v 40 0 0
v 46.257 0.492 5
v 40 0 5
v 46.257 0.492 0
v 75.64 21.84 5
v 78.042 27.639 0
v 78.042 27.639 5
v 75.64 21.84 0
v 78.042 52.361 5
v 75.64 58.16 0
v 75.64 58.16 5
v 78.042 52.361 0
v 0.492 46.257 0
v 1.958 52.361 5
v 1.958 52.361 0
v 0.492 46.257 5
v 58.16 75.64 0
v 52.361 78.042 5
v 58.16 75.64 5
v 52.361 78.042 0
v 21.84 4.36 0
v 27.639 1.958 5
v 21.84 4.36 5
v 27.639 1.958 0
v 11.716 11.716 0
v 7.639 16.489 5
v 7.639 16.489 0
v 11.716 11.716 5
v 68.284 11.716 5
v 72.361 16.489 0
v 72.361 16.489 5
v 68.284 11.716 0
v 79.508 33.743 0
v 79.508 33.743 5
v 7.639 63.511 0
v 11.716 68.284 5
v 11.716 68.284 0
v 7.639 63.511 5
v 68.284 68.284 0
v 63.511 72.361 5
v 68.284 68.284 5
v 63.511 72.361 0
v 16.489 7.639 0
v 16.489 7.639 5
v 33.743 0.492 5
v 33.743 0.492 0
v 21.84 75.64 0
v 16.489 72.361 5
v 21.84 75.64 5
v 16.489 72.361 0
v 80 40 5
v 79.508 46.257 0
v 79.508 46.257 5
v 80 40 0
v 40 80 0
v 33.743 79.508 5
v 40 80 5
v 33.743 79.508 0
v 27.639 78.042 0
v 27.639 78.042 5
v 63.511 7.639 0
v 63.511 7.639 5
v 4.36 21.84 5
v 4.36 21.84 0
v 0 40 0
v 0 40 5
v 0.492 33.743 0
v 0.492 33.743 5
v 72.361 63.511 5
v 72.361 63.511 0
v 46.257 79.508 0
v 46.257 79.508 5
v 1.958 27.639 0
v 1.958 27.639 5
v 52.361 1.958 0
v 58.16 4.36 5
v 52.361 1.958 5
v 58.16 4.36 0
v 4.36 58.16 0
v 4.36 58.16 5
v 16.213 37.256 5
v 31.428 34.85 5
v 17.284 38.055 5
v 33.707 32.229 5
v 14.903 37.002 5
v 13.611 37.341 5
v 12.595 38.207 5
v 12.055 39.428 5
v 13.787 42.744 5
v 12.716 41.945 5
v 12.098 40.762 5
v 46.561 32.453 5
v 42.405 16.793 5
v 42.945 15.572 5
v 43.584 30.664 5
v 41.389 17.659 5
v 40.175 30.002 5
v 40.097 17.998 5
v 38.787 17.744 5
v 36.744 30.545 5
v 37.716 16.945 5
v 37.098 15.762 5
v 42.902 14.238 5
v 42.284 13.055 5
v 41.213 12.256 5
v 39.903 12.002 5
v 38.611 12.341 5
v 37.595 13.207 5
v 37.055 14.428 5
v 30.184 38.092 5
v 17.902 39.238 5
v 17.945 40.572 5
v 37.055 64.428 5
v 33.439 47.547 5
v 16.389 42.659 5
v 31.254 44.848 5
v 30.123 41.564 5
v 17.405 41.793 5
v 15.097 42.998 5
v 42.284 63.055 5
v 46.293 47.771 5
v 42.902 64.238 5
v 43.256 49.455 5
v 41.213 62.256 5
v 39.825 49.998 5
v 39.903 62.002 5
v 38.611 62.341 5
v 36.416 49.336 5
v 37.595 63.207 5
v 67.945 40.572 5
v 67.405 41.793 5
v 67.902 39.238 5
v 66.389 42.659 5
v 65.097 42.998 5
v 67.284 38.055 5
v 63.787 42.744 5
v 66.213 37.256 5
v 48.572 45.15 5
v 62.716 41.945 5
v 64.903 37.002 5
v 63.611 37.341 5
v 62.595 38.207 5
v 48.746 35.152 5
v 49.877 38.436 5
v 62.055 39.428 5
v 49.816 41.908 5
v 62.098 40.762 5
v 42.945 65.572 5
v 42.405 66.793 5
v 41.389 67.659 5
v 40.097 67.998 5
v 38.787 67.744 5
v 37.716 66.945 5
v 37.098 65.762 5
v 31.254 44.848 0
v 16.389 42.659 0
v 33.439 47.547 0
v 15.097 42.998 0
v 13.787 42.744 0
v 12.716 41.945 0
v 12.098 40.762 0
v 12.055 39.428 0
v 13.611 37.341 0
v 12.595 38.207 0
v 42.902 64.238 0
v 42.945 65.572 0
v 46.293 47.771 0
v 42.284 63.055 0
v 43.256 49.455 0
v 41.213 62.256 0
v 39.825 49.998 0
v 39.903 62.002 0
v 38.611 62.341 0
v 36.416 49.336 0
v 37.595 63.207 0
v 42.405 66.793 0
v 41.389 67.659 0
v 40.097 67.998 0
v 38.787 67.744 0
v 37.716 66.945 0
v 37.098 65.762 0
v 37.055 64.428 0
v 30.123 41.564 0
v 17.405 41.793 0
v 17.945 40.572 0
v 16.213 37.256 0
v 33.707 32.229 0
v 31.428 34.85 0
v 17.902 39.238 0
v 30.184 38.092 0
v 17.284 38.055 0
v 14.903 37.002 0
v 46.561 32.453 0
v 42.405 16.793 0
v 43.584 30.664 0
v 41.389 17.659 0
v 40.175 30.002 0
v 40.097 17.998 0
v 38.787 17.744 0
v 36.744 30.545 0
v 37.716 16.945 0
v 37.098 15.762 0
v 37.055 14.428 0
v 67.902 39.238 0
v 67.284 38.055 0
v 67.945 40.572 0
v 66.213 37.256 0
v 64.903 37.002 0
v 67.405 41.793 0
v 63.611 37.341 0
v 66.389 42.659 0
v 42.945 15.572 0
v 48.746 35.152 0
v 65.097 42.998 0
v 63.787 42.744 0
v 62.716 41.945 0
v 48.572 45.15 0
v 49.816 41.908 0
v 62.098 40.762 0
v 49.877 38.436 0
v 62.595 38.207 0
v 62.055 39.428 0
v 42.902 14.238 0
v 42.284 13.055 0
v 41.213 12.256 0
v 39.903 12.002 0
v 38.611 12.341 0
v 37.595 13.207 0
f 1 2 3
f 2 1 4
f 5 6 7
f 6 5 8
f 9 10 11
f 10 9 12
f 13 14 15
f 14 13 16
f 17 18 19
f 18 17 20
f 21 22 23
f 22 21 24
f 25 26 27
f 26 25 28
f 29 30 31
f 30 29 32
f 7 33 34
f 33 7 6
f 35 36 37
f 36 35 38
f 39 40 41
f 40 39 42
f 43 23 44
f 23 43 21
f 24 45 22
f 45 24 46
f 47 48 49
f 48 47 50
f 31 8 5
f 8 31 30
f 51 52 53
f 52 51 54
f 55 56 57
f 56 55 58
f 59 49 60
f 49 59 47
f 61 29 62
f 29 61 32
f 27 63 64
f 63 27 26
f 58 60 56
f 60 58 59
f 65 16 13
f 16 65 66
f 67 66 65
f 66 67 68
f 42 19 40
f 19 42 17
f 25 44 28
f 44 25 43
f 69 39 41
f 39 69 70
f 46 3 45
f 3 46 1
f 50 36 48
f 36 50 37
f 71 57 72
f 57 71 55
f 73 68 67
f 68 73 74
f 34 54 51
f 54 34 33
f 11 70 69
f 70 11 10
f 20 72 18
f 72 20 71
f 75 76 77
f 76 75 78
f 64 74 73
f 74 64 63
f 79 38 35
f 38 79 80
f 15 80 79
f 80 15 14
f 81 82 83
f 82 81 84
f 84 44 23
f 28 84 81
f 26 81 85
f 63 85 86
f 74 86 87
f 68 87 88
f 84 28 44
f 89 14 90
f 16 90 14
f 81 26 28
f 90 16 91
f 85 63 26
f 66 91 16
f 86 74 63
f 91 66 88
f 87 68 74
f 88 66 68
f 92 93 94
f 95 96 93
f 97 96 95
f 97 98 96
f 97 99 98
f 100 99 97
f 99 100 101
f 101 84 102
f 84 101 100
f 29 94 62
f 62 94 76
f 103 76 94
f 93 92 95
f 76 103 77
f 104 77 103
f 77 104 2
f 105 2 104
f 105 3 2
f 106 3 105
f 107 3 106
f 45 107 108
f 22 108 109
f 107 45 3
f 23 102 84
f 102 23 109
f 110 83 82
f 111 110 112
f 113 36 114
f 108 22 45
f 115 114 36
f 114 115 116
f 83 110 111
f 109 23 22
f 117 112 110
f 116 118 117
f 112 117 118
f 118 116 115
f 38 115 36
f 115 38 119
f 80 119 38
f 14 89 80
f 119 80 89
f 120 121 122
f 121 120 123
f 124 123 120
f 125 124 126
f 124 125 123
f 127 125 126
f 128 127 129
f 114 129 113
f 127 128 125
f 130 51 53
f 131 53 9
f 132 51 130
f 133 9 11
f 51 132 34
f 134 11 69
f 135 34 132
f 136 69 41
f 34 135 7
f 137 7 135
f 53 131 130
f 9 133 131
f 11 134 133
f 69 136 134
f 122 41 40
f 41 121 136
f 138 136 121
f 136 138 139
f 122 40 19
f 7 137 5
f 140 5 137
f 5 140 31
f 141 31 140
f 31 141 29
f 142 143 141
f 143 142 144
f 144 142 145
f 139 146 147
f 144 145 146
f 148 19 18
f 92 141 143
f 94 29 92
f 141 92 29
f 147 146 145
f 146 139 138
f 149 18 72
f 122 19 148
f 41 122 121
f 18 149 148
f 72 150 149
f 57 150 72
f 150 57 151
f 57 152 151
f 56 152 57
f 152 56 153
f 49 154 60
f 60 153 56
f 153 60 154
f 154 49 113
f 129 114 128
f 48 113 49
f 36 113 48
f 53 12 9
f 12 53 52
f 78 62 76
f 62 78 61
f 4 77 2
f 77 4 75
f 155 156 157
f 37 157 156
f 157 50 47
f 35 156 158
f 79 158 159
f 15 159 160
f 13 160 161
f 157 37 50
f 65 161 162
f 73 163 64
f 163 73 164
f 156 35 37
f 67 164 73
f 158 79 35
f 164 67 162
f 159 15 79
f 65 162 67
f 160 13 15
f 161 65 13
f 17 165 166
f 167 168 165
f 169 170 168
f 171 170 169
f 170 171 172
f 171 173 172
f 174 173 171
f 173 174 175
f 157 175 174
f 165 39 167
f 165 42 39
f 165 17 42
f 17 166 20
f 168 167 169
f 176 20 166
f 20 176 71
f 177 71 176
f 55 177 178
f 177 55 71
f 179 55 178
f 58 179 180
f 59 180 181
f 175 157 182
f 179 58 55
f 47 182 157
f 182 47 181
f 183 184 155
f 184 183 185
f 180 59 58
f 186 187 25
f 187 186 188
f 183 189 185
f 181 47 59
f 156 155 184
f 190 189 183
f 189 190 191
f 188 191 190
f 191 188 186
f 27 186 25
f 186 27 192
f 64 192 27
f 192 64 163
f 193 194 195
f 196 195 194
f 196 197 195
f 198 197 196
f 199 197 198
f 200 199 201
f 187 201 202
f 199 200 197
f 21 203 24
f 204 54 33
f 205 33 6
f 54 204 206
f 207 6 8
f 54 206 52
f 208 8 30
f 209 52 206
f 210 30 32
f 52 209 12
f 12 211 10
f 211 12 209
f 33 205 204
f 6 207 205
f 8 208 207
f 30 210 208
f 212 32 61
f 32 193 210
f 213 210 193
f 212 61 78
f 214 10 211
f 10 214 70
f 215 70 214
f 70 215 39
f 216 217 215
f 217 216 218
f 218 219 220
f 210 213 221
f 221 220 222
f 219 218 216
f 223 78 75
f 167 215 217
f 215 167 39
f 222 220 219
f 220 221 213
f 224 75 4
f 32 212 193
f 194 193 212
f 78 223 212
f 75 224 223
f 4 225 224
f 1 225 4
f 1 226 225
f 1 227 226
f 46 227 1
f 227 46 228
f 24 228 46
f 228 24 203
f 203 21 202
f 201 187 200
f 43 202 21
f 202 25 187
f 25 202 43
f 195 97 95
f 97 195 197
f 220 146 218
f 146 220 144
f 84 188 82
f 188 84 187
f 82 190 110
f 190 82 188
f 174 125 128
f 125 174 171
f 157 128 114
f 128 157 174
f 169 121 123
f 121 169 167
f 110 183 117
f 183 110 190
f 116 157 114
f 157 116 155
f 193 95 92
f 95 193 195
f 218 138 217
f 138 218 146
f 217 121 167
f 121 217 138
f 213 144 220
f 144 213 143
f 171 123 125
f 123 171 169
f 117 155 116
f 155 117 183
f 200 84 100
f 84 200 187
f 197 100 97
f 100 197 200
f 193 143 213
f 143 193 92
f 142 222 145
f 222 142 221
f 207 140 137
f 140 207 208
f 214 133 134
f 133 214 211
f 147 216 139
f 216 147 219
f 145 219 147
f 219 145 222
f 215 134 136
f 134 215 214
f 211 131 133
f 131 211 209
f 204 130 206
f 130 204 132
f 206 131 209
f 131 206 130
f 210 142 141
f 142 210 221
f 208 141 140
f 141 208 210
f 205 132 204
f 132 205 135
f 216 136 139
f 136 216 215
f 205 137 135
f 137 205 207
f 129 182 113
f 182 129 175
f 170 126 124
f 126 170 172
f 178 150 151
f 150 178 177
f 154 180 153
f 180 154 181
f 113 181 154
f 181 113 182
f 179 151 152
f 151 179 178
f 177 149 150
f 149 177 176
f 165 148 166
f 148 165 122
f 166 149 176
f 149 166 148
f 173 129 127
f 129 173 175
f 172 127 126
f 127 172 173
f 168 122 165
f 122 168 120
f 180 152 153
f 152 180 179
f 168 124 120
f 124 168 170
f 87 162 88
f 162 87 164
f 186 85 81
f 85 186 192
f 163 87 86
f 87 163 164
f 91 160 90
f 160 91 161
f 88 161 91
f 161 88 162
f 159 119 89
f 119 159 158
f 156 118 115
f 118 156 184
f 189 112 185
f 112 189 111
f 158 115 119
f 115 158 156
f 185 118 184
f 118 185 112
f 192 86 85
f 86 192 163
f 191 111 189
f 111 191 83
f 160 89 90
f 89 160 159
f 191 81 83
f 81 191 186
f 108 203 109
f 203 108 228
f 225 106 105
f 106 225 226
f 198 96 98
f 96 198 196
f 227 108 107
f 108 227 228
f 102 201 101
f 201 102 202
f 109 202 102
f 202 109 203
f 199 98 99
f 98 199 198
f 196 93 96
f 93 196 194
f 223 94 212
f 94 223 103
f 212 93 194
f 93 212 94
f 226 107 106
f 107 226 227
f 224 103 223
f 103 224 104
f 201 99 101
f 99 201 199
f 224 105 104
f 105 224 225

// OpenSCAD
$fn = 32;

// ----------------------------------------------------------------------
// Spacer plate: round flange R40, 4 bolts
// ----------------------------------------------------------------------

// --- parameters (mm) ---
bore_r = 10;              // centre bore radius
bolt_r = 3;               // bolt hole radius
plate_t = 5;              // plate thickness, Z (extrusion height)
flange_r = 40;            // flange radius
n_bolt = 4;               // bolt hole count
ring_r = 25;              // bolt circle radius

profile = [[80, 40], [79.508, 46.257], [78.042, 52.361], [75.64, 58.16], [72.361, 63.511], [68.284, 68.284], [63.511, 72.361], [58.16, 75.64], [52.361, 78.042], [46.257, 79.508], [40, 80], [33.743, 79.508], [27.639, 78.042], [21.84, 75.64], [16.489, 72.361], [11.716, 68.284], [7.639, 63.511], [4.36, 58.16], [1.958, 52.361], [0.492, 46.257], [0, 40], [0.492, 33.743], [1.958, 27.639], [4.36, 21.84], [7.639, 16.489], [11.716, 11.716], [16.489, 7.639], [21.84, 4.36], [27.639, 1.958], [33.743, 0.492], [40, 0], [46.257, 0.492], [52.361, 1.958], [58.16, 4.36], [63.511, 7.639], [68.284, 11.716], [72.361, 16.489], [75.64, 21.84], [78.042, 27.639], [79.508, 33.743]];  // primary outline, 40 points, counter clockwise
void_1 = [[49.816, 41.908], [48.572, 45.15], [46.293, 47.771], [43.256, 49.455], [39.825, 49.998], [36.416, 49.336], [33.439, 47.547], [31.254, 44.848], [30.123, 41.564], [30.184, 38.092], [31.428, 34.85], [33.707, 32.229], [36.744, 30.545], [40.175, 30.002], [43.584, 30.664], [46.561, 32.453], [48.746, 35.152], [49.877, 38.436]];  // centre bore, 18 points
void_2 = [[67.945, 40.572], [67.405, 41.793], [66.389, 42.659], [65.097, 42.998], [63.787, 42.744], [62.716, 41.945], [62.098, 40.762], [62.055, 39.428], [62.595, 38.207], [63.611, 37.341], [64.903, 37.002], [66.213, 37.256], [67.284, 38.055], [67.902, 39.238]];  // bolt hole 1, 14 points
void_3 = [[42.945, 65.572], [42.405, 66.793], [41.389, 67.659], [40.097, 67.998], [38.787, 67.744], [37.716, 66.945], [37.098, 65.762], [37.055, 64.428], [37.595, 63.207], [38.611, 62.341], [39.903, 62.002], [41.213, 62.256], [42.284, 63.055], [42.902, 64.238]];  // bolt hole 2, 14 points
void_4 = [[17.945, 40.572], [17.405, 41.793], [16.389, 42.659], [15.097, 42.998], [13.787, 42.744], [12.716, 41.945], [12.098, 40.762], [12.055, 39.428], [12.595, 38.207], [13.611, 37.341], [14.903, 37.002], [16.213, 37.256], [17.284, 38.055], [17.902, 39.238]];  // bolt hole 3, 14 points
void_5 = [[42.945, 15.572], [42.405, 16.793], [41.389, 17.659], [40.097, 17.998], [38.787, 17.744], [37.716, 16.945], [37.098, 15.762], [37.055, 14.428], [37.595, 13.207], [38.611, 12.341], [39.903, 12.002], [41.213, 12.256], [42.284, 13.055], [42.902, 14.238]];  // bolt hole 4, 14 points

// --- the one profile operation ---
difference() {
  linear_extrude(height = plate_t) polygon(points = profile);
  translate([0, 0, -1])
    linear_extrude(height = plate_t + 2) polygon(points = void_1);
  translate([0, 0, -1])
    linear_extrude(height = plate_t + 2) polygon(points = void_2);
  translate([0, 0, -1])
    linear_extrude(height = plate_t + 2) polygon(points = void_3);
  translate([0, 0, -1])
    linear_extrude(height = plate_t + 2) polygon(points = void_4);
  translate([0, 0, -1])
    linear_extrude(height = plate_t + 2) polygon(points = void_5);
}
